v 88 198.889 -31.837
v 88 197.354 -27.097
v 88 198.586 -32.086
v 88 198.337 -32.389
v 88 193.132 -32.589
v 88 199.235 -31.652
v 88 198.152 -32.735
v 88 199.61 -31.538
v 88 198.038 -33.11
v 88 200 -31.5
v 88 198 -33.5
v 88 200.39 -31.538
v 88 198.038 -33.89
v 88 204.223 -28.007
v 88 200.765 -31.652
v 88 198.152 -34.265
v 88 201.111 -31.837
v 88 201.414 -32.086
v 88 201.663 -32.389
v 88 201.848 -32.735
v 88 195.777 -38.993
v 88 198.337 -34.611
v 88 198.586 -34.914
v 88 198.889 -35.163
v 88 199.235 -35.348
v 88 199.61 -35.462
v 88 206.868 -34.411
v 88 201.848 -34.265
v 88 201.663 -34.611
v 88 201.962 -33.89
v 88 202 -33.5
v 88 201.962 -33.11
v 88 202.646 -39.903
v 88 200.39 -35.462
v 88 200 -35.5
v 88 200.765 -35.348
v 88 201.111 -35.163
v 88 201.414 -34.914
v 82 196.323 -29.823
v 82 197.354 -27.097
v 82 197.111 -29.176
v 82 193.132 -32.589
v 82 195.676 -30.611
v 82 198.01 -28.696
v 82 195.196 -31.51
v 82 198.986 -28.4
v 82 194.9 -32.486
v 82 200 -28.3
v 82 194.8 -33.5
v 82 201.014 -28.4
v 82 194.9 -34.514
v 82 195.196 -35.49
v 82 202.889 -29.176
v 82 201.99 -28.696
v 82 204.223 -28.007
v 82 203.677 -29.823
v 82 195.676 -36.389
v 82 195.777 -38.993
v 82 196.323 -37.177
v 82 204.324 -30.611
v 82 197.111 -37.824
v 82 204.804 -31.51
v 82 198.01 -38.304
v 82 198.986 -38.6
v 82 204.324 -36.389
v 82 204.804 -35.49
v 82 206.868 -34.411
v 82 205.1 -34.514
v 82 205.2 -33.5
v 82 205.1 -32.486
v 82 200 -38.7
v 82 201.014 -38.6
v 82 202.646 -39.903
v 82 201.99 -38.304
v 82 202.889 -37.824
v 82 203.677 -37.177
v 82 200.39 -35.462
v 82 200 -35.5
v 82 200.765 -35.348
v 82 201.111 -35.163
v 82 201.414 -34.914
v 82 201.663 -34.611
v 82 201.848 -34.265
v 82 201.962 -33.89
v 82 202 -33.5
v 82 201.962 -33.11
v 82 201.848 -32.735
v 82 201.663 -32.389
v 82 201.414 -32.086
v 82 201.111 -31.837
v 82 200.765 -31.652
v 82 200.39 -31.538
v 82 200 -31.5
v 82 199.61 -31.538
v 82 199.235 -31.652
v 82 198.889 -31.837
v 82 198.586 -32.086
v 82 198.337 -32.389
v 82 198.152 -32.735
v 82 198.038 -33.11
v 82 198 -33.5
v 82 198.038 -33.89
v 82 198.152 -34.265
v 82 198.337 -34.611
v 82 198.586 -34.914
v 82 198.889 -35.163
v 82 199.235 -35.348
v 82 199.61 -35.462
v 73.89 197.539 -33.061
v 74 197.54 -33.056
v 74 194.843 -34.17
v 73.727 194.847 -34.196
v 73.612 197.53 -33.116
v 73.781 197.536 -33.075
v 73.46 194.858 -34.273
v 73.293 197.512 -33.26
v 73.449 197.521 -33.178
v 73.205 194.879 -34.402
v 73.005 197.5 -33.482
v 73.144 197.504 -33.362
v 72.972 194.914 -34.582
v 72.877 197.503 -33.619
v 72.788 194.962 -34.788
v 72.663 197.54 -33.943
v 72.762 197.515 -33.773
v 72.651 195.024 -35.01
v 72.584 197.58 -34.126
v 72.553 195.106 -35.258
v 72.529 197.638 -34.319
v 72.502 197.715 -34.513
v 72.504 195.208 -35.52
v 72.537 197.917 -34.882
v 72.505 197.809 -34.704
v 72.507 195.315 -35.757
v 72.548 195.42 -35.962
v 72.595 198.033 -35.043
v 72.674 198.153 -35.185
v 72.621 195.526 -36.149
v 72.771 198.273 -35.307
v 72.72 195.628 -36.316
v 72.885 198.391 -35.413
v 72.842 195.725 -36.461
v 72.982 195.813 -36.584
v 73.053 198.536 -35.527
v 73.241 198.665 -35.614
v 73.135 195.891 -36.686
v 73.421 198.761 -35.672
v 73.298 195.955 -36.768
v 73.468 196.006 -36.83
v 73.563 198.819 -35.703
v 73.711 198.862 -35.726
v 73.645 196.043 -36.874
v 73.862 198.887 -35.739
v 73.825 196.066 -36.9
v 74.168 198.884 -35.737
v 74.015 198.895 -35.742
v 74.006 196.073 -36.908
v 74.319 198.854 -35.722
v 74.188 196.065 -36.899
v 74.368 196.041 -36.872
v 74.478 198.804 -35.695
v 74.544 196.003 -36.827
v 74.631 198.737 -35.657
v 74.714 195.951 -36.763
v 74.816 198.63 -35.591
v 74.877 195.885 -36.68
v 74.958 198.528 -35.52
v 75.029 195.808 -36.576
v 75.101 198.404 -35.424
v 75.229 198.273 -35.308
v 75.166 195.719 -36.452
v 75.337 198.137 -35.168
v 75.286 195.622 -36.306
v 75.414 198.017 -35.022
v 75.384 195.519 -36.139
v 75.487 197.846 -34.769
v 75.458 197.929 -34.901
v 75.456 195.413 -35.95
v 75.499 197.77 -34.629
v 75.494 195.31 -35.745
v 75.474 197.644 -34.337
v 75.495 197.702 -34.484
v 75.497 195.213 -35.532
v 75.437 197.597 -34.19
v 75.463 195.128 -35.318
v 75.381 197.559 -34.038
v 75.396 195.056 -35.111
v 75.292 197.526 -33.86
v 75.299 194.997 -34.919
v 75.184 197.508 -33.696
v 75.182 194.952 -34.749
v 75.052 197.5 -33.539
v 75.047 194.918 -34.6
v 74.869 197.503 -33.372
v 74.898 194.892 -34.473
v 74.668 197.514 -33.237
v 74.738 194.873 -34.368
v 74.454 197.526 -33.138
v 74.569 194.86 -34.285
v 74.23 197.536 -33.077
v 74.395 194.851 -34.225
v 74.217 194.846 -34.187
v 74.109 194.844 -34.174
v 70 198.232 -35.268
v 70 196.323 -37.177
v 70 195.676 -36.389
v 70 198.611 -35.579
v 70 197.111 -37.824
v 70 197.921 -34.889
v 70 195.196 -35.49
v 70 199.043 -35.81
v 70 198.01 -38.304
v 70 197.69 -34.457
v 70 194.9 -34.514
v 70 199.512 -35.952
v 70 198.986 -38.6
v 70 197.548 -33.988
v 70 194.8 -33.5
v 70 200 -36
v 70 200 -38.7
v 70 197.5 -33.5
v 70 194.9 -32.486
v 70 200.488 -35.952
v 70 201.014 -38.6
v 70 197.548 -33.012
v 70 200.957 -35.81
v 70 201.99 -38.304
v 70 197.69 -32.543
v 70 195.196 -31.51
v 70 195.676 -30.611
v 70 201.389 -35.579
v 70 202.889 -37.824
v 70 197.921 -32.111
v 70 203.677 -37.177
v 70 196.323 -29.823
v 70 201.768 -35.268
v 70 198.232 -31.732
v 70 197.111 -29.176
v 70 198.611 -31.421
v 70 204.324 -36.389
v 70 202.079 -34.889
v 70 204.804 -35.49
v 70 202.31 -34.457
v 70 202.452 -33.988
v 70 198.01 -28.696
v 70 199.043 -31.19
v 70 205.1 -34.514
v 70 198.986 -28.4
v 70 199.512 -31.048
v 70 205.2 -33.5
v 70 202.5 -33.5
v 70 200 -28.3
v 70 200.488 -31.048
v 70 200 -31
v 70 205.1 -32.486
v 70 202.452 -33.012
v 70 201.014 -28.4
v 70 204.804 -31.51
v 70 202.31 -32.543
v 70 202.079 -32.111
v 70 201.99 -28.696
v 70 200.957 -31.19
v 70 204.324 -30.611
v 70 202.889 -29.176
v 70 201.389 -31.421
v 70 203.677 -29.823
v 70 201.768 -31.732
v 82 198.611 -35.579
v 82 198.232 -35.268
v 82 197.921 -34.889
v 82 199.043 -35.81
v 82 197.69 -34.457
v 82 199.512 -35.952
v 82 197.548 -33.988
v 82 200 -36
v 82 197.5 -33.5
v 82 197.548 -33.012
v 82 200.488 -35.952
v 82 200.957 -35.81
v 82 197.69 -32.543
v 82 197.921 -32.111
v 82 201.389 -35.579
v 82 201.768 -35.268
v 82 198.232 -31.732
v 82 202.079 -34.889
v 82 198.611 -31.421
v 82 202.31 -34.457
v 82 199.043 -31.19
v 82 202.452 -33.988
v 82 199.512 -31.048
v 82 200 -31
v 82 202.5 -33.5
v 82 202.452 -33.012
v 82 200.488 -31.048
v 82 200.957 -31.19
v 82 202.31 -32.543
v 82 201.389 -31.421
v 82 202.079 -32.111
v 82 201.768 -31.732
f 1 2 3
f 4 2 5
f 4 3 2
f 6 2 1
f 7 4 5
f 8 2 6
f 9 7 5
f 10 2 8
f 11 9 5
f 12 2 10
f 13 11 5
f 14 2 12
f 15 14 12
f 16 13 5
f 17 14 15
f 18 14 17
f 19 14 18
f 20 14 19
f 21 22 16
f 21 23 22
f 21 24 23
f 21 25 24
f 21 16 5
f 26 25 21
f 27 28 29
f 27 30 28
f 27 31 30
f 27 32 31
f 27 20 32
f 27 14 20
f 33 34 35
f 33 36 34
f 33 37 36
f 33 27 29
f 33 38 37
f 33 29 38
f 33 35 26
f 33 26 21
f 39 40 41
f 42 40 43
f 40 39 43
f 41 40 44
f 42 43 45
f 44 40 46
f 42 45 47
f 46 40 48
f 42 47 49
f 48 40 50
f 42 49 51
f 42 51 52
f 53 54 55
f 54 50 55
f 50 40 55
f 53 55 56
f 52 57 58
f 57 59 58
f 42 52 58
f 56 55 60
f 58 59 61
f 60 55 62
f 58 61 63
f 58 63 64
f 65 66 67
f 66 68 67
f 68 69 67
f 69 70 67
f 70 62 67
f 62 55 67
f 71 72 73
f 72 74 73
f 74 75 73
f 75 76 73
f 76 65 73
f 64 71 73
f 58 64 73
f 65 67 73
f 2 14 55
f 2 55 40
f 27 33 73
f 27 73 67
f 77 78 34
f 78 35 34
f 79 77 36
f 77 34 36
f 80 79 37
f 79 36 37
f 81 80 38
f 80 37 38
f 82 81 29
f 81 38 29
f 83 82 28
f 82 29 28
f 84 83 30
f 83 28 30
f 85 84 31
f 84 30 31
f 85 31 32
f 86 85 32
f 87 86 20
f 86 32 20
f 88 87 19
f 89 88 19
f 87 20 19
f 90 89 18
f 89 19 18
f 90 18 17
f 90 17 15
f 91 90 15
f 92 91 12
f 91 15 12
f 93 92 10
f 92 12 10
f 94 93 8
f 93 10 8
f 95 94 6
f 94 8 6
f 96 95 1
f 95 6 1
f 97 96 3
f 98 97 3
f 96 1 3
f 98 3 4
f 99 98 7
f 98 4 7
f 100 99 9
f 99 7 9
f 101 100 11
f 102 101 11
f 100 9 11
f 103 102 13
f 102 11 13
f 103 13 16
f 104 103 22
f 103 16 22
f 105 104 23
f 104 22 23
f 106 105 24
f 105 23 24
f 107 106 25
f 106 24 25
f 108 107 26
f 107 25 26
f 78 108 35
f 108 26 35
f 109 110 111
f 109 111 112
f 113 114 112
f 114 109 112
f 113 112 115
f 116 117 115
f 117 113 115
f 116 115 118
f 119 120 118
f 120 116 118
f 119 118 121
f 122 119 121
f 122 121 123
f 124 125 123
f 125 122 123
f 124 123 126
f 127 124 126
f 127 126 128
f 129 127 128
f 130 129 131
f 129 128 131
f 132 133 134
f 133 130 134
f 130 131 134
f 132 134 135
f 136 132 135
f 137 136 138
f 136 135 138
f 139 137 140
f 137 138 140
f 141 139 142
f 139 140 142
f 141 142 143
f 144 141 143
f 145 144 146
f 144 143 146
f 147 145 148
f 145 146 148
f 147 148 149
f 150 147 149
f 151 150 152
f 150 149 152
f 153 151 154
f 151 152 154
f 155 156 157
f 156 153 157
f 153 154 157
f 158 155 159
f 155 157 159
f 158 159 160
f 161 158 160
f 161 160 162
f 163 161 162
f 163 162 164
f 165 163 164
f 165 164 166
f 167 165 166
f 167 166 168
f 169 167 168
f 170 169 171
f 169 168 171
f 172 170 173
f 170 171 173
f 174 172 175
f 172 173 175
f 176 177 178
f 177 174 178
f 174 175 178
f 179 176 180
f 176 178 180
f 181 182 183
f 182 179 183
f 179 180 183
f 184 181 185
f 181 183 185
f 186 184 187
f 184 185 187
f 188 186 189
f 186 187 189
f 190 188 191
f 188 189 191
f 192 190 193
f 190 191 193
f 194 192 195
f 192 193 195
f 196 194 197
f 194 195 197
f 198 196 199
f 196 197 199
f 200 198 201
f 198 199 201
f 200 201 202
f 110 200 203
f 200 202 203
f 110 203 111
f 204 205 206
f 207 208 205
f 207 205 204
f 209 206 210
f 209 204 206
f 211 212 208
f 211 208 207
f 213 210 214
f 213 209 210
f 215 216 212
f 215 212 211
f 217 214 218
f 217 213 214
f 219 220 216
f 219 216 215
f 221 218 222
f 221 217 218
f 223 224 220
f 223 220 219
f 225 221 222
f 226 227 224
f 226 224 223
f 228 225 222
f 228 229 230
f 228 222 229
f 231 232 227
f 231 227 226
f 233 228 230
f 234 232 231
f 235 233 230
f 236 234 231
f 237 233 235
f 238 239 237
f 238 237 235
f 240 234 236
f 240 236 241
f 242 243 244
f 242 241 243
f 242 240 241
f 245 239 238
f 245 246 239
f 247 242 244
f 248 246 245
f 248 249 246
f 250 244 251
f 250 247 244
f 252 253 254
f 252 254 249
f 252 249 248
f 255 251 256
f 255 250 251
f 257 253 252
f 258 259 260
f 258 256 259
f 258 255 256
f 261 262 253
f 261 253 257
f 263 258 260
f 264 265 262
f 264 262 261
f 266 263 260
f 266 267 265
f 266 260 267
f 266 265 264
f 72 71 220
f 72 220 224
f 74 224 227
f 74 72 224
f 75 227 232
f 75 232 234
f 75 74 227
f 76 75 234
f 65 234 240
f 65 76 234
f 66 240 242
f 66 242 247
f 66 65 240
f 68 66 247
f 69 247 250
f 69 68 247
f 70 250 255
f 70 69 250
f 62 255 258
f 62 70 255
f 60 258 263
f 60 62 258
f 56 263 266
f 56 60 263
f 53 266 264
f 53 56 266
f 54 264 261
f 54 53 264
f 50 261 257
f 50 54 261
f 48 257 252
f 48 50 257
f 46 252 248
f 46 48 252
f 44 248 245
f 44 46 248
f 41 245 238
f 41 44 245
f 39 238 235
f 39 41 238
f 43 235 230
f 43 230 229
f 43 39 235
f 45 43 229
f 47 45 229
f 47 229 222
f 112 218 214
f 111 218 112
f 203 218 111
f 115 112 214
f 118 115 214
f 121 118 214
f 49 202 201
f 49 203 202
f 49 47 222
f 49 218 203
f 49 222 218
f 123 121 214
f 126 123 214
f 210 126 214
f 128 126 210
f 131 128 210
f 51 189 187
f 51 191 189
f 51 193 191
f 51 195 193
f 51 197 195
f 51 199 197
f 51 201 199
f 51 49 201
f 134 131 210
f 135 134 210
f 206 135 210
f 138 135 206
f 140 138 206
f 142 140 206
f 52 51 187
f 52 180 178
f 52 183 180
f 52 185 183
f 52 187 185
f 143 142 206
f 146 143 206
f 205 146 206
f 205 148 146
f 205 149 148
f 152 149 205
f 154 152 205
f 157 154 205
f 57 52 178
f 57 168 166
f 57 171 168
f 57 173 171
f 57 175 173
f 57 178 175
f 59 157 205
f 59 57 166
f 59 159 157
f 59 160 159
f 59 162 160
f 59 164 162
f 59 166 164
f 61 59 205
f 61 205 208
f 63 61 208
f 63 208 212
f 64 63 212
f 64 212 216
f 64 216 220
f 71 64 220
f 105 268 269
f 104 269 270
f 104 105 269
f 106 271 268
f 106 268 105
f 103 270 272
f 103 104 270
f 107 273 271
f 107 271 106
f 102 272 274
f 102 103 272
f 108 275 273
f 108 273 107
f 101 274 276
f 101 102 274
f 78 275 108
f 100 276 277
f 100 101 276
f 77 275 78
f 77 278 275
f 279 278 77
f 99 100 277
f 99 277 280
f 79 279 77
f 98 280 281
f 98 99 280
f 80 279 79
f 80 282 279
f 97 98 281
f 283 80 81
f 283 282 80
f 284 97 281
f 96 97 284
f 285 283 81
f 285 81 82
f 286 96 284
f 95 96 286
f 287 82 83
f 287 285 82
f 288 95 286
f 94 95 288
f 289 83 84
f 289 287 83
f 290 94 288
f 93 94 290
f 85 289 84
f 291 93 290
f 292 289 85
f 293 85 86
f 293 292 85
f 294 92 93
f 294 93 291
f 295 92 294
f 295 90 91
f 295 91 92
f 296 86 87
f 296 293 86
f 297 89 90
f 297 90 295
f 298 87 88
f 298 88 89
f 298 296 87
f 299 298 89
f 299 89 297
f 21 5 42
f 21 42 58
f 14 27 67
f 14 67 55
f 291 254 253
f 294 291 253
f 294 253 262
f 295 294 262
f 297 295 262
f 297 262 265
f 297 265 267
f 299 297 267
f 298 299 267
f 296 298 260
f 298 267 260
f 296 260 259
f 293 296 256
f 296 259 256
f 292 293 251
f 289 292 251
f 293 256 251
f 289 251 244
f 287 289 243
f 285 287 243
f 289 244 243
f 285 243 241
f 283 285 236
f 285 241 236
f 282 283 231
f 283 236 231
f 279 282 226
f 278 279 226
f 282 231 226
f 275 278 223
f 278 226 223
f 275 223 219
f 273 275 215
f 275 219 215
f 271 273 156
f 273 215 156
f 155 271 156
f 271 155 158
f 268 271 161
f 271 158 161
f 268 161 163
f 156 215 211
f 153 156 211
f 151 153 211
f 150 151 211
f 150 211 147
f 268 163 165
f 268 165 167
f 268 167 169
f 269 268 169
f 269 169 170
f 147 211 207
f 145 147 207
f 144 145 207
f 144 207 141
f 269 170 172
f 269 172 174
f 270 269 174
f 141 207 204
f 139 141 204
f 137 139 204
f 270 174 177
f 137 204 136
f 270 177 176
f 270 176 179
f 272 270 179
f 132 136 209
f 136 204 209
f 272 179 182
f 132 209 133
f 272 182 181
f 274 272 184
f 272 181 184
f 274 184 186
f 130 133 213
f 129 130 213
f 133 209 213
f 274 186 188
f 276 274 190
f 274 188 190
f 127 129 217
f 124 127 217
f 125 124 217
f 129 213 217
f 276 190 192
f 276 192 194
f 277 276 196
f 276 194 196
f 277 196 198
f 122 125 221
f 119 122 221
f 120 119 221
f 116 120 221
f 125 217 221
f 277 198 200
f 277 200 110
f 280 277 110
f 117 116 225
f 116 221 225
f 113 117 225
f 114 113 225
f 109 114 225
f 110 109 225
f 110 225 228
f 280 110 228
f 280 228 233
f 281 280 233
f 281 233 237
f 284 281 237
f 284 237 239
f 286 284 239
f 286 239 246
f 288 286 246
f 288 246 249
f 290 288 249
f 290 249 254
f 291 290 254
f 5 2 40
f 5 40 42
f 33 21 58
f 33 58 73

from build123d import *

# Parameters (mm, degrees)
EXTRUDE_1_DEPTH                = 6
SKETCH_2_W                     = 12
SKETCH_2_H                     = 5.2
HOLE_WIZARD_M3_5_1_D           = 4
HOLE_WIZARD_M3_5_1_CBORE_D     = 5
HOLE_WIZARD_M3_5_1_CBORE_DEPTH = 12
SKETCH_5_W                     = 1.5
SKETCH_5_H                     = 6.915054242


with BuildPart() as part:
    # 草图1 → 凸台-拉伸1 (new body)
    with BuildSketch(Plane(origin=(88, 0, 0), x_dir=(0, 0, -1), z_dir=(1, 0, 0))):
        Polygon((27.096784191, 197.354470317), (32.589488008, 193.131887602), (38.992703817, 195.777417285), (39.903215809, 202.645529683), (34.410511992, 206.868112398), (28.007296183, 204.222582715), align=None)
    extrude(amount=-EXTRUDE_1_DEPTH)

    # 草图2 → 旋转1 (revolve)
    with BuildSketch(Plane.XY.offset(-33.5), mode=Mode.PRIVATE) as revolve_1_sk:
        with Locations((76, 202.6)):
            Rectangle(SKETCH_2_W, SKETCH_2_H)
    revolve(revolve_1_sk.sketch.rotate(Axis((70, 200, -33.5), (1, 0, 0)), 270), axis=Axis((70, 200, -33.5), (1, 0, 0)))

    # M3.5 六角头机械螺钉的柱形沉头孔1 (through all)
    with Locations(Plane.ZY.offset(-70)):
        with Locations((-33.5, 200)):
            CounterBoreHole(HOLE_WIZARD_M3_5_1_D / 2, HOLE_WIZARD_M3_5_1_CBORE_D / 2, HOLE_WIZARD_M3_5_1_CBORE_DEPTH)

    # 草图5 → Ø3.0 (3) 直径孔1 (revolve, cut)
    with BuildSketch(Plane(origin=(74, 198.322079162, -34.356128365), x_dir=(0, -0.3818493186865922, 0.9242245927363032), z_dir=(1, 0, 0))):
        with Locations((0.75, 3.457527121)):
            Rectangle(SKETCH_5_W, SKETCH_5_H)
    revolve(axis=Axis((74, 204.190905326, -31.931385192), (0, -0.9242245927363031, -0.38184931868659217)), mode=Mode.SUBTRACT)


solid = part.part
